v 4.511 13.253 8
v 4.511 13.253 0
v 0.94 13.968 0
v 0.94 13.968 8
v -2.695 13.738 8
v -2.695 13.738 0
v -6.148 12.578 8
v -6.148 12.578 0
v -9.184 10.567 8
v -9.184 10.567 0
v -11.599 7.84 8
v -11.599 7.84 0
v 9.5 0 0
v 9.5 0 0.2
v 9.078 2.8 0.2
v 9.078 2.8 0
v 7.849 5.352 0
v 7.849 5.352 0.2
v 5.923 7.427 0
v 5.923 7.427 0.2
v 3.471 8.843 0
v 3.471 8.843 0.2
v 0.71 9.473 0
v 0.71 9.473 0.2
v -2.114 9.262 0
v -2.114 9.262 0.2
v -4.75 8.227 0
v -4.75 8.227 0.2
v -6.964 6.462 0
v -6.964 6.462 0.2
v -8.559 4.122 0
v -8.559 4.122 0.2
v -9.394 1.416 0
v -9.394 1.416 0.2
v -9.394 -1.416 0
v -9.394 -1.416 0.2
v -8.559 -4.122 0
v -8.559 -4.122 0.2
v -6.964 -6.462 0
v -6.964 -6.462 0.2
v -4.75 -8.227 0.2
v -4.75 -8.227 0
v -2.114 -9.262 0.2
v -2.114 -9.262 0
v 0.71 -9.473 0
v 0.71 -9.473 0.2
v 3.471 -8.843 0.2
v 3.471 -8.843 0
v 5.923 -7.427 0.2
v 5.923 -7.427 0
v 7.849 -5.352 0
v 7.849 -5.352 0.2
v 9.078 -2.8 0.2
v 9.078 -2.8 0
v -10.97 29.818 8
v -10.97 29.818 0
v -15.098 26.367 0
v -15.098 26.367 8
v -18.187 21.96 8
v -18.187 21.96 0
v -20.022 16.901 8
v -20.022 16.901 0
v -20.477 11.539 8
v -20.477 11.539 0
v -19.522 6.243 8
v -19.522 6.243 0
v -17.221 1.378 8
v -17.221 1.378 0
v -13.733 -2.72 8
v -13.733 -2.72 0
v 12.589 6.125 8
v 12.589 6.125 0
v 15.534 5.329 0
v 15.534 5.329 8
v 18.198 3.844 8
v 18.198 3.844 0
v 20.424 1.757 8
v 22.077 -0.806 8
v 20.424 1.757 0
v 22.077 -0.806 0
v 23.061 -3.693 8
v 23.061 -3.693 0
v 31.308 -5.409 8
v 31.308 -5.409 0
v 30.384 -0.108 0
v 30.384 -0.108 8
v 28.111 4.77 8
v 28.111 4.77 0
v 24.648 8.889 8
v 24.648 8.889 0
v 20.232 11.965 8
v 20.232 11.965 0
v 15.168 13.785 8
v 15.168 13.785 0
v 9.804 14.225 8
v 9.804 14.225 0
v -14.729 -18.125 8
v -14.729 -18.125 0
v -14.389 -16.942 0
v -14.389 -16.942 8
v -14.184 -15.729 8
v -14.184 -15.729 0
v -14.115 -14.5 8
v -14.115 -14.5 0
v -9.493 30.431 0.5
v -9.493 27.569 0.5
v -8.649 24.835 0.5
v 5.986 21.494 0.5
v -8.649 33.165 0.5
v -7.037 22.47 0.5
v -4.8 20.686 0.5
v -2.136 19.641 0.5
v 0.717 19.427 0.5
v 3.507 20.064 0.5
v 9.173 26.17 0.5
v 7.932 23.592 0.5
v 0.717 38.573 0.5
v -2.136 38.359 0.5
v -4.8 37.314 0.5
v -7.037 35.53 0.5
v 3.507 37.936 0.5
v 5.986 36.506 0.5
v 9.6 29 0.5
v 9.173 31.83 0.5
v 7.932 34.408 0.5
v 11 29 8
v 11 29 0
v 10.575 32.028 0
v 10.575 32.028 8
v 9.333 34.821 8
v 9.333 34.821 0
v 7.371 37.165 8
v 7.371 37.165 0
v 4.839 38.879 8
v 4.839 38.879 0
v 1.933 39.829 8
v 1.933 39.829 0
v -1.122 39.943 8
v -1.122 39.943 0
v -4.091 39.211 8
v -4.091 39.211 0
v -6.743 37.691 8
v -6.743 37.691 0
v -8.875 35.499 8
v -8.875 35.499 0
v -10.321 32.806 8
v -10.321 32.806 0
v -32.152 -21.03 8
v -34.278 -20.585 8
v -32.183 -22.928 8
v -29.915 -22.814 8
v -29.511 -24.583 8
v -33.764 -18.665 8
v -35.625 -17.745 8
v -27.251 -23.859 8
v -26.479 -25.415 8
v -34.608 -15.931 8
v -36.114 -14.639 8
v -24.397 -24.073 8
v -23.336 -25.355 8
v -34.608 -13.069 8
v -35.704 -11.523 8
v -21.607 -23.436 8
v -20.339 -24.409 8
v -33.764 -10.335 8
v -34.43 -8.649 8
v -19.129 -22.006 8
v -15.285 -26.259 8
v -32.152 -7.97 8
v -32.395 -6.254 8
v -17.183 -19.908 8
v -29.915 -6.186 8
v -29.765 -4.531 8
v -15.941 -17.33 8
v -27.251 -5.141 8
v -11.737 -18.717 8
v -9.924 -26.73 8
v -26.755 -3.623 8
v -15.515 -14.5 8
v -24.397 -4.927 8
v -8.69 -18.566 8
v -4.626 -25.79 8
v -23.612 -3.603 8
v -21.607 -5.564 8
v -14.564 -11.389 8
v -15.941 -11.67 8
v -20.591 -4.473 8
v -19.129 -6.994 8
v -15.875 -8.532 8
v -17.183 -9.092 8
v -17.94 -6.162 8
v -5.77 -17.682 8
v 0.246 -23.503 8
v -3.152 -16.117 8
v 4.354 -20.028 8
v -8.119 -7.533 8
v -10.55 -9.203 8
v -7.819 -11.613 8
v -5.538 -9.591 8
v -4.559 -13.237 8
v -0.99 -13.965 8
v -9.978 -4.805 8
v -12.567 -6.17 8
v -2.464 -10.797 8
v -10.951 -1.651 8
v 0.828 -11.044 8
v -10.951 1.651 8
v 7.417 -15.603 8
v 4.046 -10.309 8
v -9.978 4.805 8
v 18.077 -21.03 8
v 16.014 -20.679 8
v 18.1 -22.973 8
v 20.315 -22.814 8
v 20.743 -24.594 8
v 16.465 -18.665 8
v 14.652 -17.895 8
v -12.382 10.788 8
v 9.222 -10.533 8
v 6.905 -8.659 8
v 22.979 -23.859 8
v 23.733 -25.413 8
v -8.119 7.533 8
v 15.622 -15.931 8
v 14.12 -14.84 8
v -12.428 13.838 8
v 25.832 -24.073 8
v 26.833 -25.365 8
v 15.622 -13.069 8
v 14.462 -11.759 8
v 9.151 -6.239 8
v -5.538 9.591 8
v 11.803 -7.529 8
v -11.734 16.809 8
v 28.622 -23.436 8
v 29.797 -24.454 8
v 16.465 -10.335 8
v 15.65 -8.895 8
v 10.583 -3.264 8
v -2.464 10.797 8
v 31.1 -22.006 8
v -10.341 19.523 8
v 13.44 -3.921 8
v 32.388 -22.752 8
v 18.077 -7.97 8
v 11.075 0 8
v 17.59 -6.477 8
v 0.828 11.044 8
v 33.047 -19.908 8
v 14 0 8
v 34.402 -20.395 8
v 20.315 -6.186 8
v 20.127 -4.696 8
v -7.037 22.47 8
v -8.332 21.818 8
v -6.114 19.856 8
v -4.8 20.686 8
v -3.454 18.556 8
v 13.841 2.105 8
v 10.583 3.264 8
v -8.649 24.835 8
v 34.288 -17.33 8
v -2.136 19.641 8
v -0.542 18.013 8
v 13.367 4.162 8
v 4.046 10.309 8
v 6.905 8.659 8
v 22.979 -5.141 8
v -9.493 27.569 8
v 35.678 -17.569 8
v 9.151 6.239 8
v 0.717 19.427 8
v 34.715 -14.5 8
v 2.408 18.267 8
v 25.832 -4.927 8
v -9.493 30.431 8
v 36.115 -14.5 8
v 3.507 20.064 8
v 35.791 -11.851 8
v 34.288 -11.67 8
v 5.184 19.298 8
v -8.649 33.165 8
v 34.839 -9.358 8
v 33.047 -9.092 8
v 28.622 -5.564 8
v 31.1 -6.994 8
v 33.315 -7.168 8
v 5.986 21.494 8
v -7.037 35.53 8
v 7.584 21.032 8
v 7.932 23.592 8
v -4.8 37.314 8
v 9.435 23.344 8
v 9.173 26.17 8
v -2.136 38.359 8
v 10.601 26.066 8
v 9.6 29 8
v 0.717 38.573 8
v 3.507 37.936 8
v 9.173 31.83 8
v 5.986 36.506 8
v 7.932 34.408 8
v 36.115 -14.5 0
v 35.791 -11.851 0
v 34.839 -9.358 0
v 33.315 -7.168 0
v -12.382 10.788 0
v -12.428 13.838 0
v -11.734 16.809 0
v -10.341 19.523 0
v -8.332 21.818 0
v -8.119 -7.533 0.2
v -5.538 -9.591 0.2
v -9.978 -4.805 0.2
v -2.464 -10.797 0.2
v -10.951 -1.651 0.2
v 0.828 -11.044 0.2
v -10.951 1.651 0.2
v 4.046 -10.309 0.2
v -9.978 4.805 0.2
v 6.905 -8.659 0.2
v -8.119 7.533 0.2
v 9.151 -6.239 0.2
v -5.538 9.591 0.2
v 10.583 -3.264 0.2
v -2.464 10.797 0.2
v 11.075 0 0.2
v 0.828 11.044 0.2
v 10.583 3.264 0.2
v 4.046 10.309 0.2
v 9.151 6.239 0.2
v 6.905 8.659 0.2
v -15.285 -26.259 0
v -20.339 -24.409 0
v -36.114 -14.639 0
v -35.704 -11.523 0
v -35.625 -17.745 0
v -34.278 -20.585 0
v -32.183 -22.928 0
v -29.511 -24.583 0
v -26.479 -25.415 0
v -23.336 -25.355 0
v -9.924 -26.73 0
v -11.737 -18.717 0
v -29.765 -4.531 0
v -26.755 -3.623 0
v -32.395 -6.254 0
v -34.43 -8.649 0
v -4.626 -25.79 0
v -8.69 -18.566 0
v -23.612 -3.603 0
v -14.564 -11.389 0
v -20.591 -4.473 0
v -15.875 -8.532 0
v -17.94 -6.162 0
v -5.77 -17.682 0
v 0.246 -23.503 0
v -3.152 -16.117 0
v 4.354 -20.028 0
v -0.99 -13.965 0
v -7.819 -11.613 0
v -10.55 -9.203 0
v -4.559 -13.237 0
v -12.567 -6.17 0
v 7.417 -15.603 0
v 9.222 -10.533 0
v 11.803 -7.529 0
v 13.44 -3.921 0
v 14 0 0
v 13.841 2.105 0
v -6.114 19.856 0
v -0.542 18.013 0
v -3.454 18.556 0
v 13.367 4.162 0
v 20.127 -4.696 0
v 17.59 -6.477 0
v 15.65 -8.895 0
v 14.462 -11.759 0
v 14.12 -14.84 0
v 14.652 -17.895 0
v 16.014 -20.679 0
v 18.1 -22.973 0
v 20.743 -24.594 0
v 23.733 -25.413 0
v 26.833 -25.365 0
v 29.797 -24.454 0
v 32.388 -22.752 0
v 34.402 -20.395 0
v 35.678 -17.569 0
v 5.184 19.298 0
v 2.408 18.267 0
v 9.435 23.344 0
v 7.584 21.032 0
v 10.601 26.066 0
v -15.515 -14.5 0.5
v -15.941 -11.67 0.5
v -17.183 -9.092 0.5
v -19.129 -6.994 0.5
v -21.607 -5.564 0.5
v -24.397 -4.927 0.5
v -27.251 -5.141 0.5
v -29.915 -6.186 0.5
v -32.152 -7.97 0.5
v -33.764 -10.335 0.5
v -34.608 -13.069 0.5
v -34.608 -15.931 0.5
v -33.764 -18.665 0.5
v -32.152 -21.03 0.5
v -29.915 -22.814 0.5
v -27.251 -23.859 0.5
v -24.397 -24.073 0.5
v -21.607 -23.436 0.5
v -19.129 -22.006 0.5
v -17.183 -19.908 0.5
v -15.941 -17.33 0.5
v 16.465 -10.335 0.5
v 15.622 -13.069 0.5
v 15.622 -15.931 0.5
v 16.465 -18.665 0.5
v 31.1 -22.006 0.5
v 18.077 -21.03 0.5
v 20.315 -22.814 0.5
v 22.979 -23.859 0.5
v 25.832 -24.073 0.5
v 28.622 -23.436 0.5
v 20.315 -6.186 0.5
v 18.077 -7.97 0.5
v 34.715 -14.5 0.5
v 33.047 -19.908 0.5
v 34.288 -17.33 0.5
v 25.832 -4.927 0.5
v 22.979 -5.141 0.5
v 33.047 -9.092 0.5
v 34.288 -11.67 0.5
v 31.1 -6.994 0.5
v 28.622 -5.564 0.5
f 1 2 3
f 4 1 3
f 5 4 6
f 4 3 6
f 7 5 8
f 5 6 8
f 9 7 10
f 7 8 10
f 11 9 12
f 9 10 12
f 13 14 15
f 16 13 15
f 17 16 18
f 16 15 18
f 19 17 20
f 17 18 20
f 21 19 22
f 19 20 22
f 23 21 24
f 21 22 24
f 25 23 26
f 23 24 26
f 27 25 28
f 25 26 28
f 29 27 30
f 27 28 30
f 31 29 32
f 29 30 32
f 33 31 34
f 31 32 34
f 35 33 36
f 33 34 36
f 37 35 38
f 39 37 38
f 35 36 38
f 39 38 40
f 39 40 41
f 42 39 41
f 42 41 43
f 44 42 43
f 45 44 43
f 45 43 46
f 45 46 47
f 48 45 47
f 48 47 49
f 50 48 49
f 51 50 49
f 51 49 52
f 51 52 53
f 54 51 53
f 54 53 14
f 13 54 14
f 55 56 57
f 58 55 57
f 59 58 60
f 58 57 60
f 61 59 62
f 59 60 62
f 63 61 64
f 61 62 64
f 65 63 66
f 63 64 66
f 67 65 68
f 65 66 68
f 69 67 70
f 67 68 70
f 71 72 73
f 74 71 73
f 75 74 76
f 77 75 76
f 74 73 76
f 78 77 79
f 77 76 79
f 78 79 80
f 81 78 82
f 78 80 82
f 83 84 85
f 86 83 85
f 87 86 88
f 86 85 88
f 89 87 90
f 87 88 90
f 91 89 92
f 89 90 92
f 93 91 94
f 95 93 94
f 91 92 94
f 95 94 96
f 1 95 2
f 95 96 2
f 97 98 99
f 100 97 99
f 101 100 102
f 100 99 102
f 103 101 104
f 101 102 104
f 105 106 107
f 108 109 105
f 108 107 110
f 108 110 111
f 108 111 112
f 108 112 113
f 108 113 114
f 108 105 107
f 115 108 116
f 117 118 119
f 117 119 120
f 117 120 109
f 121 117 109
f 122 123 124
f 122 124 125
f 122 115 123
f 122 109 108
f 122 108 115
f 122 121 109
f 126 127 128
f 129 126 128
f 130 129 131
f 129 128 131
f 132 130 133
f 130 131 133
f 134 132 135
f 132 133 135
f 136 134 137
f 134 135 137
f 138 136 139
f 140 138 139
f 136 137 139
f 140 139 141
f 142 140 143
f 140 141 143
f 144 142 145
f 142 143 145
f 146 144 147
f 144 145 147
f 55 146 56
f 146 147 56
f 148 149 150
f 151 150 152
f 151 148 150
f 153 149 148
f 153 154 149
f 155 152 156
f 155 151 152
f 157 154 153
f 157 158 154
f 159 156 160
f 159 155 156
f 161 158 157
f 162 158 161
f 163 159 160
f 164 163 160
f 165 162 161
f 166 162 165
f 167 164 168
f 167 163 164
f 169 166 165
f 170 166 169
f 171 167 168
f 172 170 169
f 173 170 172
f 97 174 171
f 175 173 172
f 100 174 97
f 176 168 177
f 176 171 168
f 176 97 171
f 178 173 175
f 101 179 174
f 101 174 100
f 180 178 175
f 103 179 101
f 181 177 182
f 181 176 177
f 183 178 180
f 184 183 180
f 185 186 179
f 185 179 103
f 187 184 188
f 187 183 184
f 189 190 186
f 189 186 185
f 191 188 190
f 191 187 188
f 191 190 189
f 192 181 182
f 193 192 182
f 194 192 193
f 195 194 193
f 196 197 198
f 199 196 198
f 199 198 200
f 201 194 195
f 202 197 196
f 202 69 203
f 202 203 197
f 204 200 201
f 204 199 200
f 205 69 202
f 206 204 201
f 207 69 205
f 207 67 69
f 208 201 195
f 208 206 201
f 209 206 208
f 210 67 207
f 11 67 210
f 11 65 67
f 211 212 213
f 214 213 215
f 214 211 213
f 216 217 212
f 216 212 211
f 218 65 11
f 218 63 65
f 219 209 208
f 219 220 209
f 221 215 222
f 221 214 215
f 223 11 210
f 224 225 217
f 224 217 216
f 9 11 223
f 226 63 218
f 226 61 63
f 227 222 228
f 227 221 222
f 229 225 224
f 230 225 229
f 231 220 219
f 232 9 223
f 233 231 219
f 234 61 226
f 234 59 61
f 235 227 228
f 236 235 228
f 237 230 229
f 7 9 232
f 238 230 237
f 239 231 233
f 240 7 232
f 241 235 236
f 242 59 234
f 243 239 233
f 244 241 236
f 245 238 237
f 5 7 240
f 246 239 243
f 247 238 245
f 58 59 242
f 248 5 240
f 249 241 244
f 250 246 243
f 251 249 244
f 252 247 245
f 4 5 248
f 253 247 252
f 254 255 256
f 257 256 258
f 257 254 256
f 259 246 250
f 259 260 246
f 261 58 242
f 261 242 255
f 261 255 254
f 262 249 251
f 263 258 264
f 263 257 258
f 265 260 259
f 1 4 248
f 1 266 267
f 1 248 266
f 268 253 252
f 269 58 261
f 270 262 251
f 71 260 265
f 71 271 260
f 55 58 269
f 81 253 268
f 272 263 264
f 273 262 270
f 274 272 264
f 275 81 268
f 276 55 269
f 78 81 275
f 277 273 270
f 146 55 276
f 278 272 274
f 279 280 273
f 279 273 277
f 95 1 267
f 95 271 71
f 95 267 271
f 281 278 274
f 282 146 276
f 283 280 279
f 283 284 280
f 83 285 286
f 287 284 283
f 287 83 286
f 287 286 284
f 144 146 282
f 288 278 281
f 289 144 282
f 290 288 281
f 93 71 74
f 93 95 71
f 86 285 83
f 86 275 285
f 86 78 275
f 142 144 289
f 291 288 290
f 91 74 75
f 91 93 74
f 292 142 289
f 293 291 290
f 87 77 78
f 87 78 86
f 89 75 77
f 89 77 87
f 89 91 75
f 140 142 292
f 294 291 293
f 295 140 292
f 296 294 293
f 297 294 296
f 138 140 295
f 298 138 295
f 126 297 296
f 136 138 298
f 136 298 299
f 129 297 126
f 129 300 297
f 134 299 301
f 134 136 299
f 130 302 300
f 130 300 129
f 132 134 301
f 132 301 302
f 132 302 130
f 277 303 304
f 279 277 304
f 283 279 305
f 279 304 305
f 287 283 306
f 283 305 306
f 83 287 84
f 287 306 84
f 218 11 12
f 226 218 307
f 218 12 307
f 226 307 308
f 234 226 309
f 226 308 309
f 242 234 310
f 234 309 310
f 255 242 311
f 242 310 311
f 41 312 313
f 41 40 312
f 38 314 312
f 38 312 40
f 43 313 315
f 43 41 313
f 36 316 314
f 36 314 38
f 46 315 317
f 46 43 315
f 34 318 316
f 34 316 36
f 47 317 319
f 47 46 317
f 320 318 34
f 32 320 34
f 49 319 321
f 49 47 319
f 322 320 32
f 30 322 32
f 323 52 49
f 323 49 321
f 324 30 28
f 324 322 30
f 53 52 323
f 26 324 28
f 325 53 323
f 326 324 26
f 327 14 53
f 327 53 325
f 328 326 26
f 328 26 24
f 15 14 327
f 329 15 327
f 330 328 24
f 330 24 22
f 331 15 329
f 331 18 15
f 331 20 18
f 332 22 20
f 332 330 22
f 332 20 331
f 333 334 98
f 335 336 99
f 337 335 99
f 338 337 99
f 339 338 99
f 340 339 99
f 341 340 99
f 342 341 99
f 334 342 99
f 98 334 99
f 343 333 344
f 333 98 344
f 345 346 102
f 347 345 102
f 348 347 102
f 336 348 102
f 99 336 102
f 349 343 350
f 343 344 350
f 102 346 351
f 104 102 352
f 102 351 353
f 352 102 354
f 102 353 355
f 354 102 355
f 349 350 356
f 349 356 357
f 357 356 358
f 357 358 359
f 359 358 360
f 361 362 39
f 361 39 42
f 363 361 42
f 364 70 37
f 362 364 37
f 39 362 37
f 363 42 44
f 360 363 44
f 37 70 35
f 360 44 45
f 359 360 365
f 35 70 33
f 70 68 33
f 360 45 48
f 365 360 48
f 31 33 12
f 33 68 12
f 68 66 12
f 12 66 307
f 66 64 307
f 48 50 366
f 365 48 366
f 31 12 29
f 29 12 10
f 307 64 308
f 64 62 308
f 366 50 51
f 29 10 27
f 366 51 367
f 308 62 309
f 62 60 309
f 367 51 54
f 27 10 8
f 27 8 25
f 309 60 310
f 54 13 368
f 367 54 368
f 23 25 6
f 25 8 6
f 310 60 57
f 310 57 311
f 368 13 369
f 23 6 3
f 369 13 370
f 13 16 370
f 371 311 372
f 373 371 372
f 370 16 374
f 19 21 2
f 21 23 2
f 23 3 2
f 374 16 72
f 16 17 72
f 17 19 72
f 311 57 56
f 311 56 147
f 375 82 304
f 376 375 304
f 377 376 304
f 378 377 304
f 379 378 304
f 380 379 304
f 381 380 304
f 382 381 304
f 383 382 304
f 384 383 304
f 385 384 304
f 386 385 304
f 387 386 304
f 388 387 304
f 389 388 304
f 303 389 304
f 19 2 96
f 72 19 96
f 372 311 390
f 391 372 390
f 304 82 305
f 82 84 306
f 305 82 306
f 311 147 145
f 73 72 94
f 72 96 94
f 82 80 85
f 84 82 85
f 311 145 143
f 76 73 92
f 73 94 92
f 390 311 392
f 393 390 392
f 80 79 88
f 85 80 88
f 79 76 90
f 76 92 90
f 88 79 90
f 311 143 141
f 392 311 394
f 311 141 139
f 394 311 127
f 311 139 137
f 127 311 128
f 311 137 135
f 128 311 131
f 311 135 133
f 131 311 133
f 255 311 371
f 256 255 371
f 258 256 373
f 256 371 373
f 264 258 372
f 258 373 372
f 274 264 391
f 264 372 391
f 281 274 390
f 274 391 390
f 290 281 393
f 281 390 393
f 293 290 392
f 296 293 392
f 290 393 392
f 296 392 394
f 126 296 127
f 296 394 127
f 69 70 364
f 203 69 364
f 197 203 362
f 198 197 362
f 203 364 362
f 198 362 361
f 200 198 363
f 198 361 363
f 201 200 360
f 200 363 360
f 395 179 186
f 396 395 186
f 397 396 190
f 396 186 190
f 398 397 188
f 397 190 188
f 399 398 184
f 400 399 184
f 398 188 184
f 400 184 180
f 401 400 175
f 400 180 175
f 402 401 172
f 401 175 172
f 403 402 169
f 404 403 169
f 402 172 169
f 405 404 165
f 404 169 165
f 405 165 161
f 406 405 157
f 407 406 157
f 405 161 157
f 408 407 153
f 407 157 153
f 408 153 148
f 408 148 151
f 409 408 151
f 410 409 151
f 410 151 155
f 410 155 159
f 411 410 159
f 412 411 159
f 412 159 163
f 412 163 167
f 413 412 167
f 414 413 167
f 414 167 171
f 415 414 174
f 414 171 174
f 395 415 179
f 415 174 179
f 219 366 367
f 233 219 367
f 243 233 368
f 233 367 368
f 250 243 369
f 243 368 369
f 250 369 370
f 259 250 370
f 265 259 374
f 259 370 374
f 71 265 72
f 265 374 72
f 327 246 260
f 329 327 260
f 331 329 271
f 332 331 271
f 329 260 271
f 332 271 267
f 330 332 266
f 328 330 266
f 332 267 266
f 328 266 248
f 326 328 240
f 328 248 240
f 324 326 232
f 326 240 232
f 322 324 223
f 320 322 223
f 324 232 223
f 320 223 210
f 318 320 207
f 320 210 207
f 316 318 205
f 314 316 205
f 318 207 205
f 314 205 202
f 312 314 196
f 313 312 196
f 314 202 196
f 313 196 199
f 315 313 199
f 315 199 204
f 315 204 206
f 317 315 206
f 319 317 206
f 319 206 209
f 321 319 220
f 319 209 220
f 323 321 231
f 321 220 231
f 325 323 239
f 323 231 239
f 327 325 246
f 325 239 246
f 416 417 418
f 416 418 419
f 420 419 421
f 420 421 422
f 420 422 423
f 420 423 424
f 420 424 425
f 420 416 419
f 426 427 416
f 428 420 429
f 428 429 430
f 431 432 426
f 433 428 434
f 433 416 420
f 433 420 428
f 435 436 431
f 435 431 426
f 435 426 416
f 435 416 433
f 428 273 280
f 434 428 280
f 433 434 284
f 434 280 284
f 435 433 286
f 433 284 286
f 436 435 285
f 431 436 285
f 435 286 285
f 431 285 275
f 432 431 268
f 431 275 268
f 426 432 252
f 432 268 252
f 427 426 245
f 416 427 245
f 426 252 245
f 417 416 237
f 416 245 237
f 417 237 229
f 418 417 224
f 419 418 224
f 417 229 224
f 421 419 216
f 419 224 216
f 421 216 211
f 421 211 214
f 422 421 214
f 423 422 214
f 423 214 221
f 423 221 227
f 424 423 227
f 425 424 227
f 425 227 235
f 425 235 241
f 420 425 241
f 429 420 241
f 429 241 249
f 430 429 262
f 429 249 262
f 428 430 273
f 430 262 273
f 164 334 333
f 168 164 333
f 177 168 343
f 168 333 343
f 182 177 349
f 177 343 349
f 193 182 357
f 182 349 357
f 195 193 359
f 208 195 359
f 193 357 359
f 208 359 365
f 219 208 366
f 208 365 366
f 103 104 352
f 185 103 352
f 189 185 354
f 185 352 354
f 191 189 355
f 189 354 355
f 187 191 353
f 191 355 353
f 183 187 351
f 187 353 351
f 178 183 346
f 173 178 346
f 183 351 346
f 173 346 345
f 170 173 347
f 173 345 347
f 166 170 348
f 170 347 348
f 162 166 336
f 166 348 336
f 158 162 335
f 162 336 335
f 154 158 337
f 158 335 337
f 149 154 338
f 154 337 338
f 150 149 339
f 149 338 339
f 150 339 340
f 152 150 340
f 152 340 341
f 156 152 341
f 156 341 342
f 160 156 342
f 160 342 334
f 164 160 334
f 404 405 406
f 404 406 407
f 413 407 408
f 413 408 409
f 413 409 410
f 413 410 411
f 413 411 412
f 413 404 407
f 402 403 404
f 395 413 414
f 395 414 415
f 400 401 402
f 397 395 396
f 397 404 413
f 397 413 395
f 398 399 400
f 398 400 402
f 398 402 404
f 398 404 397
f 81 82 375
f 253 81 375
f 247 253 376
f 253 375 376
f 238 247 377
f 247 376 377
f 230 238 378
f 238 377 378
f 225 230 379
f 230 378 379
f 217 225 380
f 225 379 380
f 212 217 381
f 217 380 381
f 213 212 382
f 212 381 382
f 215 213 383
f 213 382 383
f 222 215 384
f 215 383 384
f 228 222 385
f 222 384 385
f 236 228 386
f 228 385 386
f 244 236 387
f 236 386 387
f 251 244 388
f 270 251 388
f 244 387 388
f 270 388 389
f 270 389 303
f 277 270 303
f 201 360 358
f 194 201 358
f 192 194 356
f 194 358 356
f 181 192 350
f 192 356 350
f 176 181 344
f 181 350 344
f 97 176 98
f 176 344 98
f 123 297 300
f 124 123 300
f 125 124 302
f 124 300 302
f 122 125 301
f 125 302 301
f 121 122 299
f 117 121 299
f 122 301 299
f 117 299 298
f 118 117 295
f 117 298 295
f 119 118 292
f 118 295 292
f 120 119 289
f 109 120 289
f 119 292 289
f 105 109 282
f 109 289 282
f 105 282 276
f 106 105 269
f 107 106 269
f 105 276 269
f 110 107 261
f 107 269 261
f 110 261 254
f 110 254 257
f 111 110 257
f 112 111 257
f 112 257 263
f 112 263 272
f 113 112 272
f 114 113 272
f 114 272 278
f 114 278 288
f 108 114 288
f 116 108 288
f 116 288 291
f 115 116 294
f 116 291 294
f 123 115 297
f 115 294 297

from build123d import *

# Parameters (mm, degrees)
F1_DEPTH = 8
F2_R     = 9.6
F3_DEPTH = 7.5
F4_R     = 9.5
F5_DEPTH = 8
F6_R     = 11.075
F7_DEPTH = 7.8


with BuildPart() as f1:
    # F0 (on Top) → F1 (new body)
    with BuildSketch(Plane.XY):
        with BuildLine():
            ThreePointArc((-20.338538175, -24.4089821655), (-2.1146153157, -24.8073076343), (9.2222039848, -10.5333258595))
            ThreePointArc((9.2222039848, -10.5333258595), (4.4593163175, -13.2708137648), (-0.9901909161, -13.9649390242))
            ThreePointArc((-0.9901909161, -13.9649390242), (-7.2029967728, -18.2136446038), (-14.7291218144, -18.1247763029))
            ThreePointArc((-14.7291218144, -18.1247763029), (-16.9084612176, -21.8250967603), (-20.338538175, -24.4089821655))
        make_face()
        with BuildLine():
            ThreePointArc((9.2222039848, -10.5333258595), (12.7497226595, -5.7831282284), (14, 0))
            ThreePointArc((14, 0), (13.6427127767, 3.1426721262), (12.5890874153, 6.1249390242))
            ThreePointArc((12.5890874153, 6.1249390242), (5.35662199, 4.9902566208), (0, 0))
            ThreePointArc((0, 0), (1.64337801, -7.1340990322), (-0.9901909161, -13.9649390242))
            ThreePointArc((-0.9901909161, -13.9649390242), (4.4593163175, -13.2708137648), (9.2222039848, -10.5333258595))
        make_face()
        with BuildLine():
            ThreePointArc((-0.9901909161, -13.9649390242), (1.64337801, -7.1340990322), (0, 0))
            ThreePointArc((0, 0), (-7, 2.1438424114), (-11.5988964992, 7.84))
            ThreePointArc((-11.5988964992, 7.84), (-13.722520008, 2.773525668), (-13.7332297731, -2.72))
            ThreePointArc((-13.7332297731, -2.72), (-9.2632036905, -10.4972880968), (-0.9901909161, -13.9649390242))
        make_face()
        with BuildLine():
            ThreePointArc((-14.1147367097, -14.5), (-34.4297295676, -8.6492814066), (-20.338538175, -24.4089821655))
            ThreePointArc((-20.338538175, -24.4089821655), (-16.9084612176, -21.8250967603), (-14.7291218144, -18.1247763029))
            ThreePointArc((-14.7291218144, -18.1247763029), (-14.2694205814, -16.3382377637), (-14.1147367097, -14.5))
        make_face()
        with BuildLine():
            ThreePointArc((31.3080677234, -5.4091996526), (27.3553188432, -3.7306085732), (23.0610776234, -3.6934055153))
            ThreePointArc((23.0610776234, -3.6934055153), (18.100118044, -22.9732003974), (36.1147367097, -14.5))
            ThreePointArc((36.1147367097, -14.5), (34.8391040709, -9.3583388458), (31.3080677234, -5.4091996526))
        make_face()
        with BuildLine():
            ThreePointArc((4.5110257882, 13.2533258595), (9.2632036905, 10.4972880968), (12.5890874153, 6.1249390242))
            ThreePointArc((12.5890874153, 6.1249390242), (19.3749773088, 2.8688441133), (23.0610776234, -3.6934055153))
            ThreePointArc((23.0610776234, -3.6934055153), (27.3553188432, -3.7306085732), (31.3080677234, -5.4091996526))
            ThreePointArc((31.3080677234, -5.4091996526), (22.5410662686, 10.5723432345), (4.5110257882, 13.2533258595))
        make_face()
        with BuildLine():
            ThreePointArc((0, 0), (5.35662199, 4.9902566208), (12.5890874153, 6.1249390242))
            ThreePointArc((12.5890874153, 6.1249390242), (9.2632036905, 10.4972880968), (4.5110257882, 13.2533258595))
            ThreePointArc((4.5110257882, 13.2533258595), (-4.4593163175, 13.2708137648), (-11.5988964992, 7.84))
            ThreePointArc((-11.5988964992, 7.84), (-7, 2.1438424114), (0, 0))
        make_face()
        with BuildLine():
            ThreePointArc((-13.7332297731, -2.72), (-13.722520008, 2.773525668), (-11.5988964992, 7.84))
            ThreePointArc((-11.5988964992, 7.84), (-12.171980536, 15.3448004906), (-8.331955809, 21.8181818182))
            ThreePointArc((-8.331955809, 21.8181818182), (-10.4468576256, 25.5557053335), (-10.9695295484, 29.8181818182))
            ThreePointArc((-10.9695295484, 29.8181818182), (-20.4264509529, 14.2349643998), (-13.7332297731, -2.72))
        make_face()
        with BuildLine():
            ThreePointArc((-10.9695295484, 29.8181818182), (-10.4468576256, 25.5557053335), (-8.331955809, 21.8181818182))
            ThreePointArc((-8.331955809, 21.8181818182), (3.8306974627, 18.6885618389), (11, 29))
            ThreePointArc((11, 29), (0.4093745034, 39.9923797476), (-10.9695295484, 29.8181818182))
        make_face()
    extrude(amount=F1_DEPTH)

    # F2 (on face) → F3 (cut)
    with BuildSketch(Plane.XY.offset(8)):
        with Locations((0, 29)):
            Circle(F2_R)
        with Locations((-25.1147367097, -14.5)):
            Circle(F2_R)
        with Locations((25.1147367097, -14.5)):
            Circle(F2_R)
    extrude(amount=-F3_DEPTH, mode=Mode.SUBTRACT)

    # F4 (on face) → F5 (cut, through all)
    with BuildSketch(Plane.XY.offset(8)):
        Circle(F4_R)
    extrude(amount=-F5_DEPTH, mode=Mode.SUBTRACT)

    # F6 (on face) → F7 (cut)
    with BuildSketch(Plane.XY.offset(8)):
        Circle(F6_R)
    extrude(amount=-F7_DEPTH, mode=Mode.SUBTRACT)


solid = f1.part
